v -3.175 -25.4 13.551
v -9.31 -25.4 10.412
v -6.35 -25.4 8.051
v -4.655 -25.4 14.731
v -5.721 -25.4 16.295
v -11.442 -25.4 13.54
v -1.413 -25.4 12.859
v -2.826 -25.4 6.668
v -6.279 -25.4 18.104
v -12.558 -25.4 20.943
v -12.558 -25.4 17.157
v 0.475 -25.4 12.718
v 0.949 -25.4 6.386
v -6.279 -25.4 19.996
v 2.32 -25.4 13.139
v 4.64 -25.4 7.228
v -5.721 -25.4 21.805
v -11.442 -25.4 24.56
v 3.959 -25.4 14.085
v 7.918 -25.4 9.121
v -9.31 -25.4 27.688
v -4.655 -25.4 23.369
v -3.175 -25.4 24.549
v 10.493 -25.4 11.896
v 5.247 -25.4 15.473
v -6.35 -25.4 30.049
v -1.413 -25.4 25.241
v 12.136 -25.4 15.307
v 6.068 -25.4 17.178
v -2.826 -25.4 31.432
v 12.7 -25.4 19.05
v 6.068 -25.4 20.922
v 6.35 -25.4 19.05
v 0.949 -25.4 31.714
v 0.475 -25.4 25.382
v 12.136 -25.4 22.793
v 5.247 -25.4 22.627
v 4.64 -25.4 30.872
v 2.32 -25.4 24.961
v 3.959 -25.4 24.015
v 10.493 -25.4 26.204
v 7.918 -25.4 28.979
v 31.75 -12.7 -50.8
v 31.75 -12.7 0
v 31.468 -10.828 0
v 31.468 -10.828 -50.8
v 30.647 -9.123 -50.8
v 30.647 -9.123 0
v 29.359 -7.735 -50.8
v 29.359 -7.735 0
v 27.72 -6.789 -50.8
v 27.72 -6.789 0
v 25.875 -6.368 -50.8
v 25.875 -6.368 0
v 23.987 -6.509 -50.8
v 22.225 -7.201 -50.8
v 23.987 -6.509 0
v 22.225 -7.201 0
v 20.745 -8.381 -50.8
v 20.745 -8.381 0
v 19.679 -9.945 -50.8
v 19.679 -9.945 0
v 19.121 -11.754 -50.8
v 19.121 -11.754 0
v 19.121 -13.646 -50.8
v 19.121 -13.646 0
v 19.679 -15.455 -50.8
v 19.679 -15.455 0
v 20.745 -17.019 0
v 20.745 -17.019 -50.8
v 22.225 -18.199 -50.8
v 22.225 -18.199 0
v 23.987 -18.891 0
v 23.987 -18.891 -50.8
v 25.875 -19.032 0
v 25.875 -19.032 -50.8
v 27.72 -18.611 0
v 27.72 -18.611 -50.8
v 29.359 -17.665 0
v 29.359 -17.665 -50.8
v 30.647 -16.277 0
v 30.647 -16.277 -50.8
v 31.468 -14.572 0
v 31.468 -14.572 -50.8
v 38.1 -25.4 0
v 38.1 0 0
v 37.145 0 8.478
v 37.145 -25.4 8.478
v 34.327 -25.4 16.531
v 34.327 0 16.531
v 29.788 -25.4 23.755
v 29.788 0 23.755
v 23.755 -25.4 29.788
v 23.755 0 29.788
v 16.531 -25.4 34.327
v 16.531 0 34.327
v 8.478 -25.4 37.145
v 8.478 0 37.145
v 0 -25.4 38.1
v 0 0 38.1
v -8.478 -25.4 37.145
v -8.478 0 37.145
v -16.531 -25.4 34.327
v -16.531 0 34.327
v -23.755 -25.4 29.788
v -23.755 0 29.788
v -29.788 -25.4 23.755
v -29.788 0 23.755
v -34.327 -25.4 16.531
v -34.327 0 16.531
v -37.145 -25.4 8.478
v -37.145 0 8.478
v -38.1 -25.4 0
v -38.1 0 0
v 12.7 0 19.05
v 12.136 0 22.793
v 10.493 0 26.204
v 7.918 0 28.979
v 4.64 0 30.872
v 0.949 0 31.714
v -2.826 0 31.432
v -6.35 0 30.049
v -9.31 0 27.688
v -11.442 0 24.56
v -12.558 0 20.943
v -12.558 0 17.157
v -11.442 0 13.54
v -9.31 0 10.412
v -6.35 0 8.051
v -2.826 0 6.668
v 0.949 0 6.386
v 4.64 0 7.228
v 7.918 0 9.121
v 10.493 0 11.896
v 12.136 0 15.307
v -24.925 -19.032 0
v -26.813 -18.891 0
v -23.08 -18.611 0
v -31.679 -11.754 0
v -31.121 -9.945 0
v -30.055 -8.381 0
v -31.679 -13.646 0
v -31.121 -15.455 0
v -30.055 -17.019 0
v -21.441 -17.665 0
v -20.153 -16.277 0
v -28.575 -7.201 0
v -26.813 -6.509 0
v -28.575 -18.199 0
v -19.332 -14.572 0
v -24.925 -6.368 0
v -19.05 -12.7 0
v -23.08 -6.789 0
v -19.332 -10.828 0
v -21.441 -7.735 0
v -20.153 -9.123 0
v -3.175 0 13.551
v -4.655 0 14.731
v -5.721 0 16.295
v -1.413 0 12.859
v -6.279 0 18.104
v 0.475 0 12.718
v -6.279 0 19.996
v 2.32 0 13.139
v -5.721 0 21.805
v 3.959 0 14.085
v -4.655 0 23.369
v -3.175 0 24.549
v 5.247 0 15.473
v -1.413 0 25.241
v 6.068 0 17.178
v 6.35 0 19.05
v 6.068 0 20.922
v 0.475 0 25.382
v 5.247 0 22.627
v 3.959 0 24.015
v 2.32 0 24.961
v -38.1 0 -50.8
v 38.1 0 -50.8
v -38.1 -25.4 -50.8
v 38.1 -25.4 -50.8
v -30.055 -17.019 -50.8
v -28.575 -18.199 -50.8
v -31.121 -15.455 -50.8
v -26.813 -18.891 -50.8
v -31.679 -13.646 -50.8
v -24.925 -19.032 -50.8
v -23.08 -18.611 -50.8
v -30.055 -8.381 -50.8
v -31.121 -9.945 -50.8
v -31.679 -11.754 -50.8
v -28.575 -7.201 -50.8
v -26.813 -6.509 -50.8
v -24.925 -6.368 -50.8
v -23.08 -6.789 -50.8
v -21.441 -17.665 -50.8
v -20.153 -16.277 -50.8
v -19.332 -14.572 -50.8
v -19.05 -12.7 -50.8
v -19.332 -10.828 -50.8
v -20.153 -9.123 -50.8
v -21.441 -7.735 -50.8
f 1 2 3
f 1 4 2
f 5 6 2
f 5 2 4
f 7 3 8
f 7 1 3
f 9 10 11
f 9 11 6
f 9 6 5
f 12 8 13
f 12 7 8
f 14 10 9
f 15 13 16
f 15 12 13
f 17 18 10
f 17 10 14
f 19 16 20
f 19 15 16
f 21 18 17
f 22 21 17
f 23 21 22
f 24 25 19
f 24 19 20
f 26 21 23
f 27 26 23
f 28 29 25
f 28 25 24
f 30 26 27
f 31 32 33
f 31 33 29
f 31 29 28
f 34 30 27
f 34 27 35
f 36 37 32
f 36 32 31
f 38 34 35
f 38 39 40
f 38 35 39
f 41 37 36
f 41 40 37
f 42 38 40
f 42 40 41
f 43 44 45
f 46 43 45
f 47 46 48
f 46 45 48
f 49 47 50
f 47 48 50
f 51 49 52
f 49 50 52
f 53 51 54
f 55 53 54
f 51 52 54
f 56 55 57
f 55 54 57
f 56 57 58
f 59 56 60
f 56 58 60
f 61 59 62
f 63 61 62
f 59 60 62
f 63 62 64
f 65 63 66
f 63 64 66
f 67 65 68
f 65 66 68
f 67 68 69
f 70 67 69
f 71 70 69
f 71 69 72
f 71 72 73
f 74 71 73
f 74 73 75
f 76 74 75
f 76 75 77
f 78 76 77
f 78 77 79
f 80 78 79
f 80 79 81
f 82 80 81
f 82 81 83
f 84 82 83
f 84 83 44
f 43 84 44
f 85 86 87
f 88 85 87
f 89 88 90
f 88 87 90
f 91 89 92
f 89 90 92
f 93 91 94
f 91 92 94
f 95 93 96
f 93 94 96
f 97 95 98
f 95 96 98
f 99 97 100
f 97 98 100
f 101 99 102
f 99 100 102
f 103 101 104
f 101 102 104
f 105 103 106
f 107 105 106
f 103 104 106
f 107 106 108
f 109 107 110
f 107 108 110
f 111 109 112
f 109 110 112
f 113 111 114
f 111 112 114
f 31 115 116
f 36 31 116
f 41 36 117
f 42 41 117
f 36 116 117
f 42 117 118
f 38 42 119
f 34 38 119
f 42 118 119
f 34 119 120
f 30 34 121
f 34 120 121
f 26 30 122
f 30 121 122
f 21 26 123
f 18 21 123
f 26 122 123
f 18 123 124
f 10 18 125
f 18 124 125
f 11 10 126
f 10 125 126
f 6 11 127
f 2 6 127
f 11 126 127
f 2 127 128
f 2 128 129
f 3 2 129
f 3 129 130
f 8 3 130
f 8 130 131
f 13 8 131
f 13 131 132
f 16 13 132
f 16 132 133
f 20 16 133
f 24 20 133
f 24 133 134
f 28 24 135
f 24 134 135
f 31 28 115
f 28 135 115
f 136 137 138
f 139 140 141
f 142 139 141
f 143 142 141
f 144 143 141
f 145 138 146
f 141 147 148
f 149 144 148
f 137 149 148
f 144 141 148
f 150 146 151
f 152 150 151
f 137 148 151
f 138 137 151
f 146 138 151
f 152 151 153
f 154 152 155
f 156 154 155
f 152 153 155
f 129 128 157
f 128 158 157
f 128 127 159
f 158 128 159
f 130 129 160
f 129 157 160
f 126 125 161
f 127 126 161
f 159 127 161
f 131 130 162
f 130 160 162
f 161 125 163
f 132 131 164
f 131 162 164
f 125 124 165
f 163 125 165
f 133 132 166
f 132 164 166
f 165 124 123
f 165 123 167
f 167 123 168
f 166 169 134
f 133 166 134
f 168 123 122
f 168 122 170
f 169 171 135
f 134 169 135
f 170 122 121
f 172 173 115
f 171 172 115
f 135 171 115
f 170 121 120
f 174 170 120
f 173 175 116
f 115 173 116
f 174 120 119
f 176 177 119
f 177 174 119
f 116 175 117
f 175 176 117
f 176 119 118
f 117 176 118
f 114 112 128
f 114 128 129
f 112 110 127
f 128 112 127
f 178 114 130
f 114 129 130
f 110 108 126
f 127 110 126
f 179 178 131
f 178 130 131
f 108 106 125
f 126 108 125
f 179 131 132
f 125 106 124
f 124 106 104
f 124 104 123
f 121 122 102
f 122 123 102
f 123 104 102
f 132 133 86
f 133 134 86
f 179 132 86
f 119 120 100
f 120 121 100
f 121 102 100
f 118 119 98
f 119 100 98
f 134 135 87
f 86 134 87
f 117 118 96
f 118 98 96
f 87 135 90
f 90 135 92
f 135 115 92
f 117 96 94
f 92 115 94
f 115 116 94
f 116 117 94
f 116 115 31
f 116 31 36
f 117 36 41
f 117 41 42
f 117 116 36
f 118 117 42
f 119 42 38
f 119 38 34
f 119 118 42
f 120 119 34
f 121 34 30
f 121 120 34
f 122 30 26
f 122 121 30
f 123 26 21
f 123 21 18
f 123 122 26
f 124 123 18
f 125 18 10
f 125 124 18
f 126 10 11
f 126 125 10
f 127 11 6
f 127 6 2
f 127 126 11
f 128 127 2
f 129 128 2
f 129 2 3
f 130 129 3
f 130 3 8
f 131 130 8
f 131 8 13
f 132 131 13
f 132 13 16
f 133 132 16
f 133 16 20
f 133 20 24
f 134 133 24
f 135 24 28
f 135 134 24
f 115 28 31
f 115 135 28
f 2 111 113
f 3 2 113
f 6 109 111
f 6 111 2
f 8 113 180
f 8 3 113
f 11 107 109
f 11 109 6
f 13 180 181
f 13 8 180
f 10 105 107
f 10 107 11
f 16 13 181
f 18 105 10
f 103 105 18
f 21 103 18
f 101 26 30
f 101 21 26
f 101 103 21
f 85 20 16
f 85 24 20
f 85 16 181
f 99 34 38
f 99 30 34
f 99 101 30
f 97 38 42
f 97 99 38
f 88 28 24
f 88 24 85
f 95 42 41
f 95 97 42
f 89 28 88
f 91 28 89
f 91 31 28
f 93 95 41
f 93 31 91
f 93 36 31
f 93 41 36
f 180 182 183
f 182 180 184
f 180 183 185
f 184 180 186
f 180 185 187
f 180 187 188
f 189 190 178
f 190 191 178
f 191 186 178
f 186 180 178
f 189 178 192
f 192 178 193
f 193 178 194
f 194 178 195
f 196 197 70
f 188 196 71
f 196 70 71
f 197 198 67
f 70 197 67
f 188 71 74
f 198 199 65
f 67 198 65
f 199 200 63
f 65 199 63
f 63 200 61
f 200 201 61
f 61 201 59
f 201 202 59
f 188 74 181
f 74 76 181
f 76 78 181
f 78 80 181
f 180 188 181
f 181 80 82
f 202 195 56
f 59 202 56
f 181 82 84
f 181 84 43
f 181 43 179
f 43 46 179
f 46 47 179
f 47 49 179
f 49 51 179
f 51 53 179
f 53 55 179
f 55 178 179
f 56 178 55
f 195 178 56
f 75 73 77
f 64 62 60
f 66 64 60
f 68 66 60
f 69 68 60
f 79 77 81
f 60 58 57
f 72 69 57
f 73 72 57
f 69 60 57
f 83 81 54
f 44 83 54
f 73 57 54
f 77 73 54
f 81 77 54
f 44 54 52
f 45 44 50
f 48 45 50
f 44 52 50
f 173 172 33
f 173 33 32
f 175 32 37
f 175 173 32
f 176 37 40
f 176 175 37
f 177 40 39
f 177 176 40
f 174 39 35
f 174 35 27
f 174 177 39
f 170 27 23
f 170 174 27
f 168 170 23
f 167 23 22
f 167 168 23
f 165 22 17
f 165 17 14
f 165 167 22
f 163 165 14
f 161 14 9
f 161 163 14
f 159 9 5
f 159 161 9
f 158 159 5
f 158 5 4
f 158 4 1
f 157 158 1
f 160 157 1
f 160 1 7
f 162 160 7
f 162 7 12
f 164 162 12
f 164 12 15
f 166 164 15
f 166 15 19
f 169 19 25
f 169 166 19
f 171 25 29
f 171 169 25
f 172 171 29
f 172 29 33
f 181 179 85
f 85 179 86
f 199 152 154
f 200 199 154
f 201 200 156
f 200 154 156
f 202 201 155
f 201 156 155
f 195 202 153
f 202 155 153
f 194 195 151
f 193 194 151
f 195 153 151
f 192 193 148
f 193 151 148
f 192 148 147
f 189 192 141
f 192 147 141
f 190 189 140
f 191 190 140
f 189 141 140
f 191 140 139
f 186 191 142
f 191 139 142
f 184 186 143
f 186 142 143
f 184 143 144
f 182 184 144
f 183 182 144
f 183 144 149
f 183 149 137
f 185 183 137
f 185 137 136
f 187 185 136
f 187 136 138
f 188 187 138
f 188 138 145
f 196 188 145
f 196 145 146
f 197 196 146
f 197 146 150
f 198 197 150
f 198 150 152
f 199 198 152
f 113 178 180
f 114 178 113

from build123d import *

# Parameters (mm, degrees)
F4_R     = 12.7
F4_W     = 76.2
F4_H     = 50.8
F0_DEPTH = 25.4
F4_R_2   = 6.35
F1_DEPTH = 25.4
F3_D     = 12.7
F3_DEPTH = 50.801


with BuildPart() as f0:
    # F4 (on Front) → F0 (new body)
    with BuildSketch(Plane.XZ):
        with BuildLine():
            Line((-38.1, 0), (38.1, 0))
            ThreePointArc((38.1, 0), (0, 38.1), (-38.1, 0))
        make_face()
        with Locations((0, 19.05)):
            Circle(F4_R, mode=Mode.SUBTRACT)
        with Locations((0, -25.4)):
            Rectangle(F4_W, F4_H)
    extrude(amount=F0_DEPTH)

    # F3 (through all, one way)
    with BuildSketch(Plane.XY):
        with Locations((-25.4, -12.7), (25.4, -12.7)):
            Circle(F3_D / 2)
    extrude(amount=-F3_DEPTH, mode=Mode.SUBTRACT)


with BuildPart() as f1:
    # F4 (on Front) → F1 (new body)
    with BuildSketch(Plane.XZ):
        with Locations((0, 19.05)):
            Circle(F4_R)
        with Locations((0, 19.05)):
            Circle(F4_R_2, mode=Mode.SUBTRACT)
    extrude(amount=F1_DEPTH)


solid = Compound([f0.part, f1.part])
